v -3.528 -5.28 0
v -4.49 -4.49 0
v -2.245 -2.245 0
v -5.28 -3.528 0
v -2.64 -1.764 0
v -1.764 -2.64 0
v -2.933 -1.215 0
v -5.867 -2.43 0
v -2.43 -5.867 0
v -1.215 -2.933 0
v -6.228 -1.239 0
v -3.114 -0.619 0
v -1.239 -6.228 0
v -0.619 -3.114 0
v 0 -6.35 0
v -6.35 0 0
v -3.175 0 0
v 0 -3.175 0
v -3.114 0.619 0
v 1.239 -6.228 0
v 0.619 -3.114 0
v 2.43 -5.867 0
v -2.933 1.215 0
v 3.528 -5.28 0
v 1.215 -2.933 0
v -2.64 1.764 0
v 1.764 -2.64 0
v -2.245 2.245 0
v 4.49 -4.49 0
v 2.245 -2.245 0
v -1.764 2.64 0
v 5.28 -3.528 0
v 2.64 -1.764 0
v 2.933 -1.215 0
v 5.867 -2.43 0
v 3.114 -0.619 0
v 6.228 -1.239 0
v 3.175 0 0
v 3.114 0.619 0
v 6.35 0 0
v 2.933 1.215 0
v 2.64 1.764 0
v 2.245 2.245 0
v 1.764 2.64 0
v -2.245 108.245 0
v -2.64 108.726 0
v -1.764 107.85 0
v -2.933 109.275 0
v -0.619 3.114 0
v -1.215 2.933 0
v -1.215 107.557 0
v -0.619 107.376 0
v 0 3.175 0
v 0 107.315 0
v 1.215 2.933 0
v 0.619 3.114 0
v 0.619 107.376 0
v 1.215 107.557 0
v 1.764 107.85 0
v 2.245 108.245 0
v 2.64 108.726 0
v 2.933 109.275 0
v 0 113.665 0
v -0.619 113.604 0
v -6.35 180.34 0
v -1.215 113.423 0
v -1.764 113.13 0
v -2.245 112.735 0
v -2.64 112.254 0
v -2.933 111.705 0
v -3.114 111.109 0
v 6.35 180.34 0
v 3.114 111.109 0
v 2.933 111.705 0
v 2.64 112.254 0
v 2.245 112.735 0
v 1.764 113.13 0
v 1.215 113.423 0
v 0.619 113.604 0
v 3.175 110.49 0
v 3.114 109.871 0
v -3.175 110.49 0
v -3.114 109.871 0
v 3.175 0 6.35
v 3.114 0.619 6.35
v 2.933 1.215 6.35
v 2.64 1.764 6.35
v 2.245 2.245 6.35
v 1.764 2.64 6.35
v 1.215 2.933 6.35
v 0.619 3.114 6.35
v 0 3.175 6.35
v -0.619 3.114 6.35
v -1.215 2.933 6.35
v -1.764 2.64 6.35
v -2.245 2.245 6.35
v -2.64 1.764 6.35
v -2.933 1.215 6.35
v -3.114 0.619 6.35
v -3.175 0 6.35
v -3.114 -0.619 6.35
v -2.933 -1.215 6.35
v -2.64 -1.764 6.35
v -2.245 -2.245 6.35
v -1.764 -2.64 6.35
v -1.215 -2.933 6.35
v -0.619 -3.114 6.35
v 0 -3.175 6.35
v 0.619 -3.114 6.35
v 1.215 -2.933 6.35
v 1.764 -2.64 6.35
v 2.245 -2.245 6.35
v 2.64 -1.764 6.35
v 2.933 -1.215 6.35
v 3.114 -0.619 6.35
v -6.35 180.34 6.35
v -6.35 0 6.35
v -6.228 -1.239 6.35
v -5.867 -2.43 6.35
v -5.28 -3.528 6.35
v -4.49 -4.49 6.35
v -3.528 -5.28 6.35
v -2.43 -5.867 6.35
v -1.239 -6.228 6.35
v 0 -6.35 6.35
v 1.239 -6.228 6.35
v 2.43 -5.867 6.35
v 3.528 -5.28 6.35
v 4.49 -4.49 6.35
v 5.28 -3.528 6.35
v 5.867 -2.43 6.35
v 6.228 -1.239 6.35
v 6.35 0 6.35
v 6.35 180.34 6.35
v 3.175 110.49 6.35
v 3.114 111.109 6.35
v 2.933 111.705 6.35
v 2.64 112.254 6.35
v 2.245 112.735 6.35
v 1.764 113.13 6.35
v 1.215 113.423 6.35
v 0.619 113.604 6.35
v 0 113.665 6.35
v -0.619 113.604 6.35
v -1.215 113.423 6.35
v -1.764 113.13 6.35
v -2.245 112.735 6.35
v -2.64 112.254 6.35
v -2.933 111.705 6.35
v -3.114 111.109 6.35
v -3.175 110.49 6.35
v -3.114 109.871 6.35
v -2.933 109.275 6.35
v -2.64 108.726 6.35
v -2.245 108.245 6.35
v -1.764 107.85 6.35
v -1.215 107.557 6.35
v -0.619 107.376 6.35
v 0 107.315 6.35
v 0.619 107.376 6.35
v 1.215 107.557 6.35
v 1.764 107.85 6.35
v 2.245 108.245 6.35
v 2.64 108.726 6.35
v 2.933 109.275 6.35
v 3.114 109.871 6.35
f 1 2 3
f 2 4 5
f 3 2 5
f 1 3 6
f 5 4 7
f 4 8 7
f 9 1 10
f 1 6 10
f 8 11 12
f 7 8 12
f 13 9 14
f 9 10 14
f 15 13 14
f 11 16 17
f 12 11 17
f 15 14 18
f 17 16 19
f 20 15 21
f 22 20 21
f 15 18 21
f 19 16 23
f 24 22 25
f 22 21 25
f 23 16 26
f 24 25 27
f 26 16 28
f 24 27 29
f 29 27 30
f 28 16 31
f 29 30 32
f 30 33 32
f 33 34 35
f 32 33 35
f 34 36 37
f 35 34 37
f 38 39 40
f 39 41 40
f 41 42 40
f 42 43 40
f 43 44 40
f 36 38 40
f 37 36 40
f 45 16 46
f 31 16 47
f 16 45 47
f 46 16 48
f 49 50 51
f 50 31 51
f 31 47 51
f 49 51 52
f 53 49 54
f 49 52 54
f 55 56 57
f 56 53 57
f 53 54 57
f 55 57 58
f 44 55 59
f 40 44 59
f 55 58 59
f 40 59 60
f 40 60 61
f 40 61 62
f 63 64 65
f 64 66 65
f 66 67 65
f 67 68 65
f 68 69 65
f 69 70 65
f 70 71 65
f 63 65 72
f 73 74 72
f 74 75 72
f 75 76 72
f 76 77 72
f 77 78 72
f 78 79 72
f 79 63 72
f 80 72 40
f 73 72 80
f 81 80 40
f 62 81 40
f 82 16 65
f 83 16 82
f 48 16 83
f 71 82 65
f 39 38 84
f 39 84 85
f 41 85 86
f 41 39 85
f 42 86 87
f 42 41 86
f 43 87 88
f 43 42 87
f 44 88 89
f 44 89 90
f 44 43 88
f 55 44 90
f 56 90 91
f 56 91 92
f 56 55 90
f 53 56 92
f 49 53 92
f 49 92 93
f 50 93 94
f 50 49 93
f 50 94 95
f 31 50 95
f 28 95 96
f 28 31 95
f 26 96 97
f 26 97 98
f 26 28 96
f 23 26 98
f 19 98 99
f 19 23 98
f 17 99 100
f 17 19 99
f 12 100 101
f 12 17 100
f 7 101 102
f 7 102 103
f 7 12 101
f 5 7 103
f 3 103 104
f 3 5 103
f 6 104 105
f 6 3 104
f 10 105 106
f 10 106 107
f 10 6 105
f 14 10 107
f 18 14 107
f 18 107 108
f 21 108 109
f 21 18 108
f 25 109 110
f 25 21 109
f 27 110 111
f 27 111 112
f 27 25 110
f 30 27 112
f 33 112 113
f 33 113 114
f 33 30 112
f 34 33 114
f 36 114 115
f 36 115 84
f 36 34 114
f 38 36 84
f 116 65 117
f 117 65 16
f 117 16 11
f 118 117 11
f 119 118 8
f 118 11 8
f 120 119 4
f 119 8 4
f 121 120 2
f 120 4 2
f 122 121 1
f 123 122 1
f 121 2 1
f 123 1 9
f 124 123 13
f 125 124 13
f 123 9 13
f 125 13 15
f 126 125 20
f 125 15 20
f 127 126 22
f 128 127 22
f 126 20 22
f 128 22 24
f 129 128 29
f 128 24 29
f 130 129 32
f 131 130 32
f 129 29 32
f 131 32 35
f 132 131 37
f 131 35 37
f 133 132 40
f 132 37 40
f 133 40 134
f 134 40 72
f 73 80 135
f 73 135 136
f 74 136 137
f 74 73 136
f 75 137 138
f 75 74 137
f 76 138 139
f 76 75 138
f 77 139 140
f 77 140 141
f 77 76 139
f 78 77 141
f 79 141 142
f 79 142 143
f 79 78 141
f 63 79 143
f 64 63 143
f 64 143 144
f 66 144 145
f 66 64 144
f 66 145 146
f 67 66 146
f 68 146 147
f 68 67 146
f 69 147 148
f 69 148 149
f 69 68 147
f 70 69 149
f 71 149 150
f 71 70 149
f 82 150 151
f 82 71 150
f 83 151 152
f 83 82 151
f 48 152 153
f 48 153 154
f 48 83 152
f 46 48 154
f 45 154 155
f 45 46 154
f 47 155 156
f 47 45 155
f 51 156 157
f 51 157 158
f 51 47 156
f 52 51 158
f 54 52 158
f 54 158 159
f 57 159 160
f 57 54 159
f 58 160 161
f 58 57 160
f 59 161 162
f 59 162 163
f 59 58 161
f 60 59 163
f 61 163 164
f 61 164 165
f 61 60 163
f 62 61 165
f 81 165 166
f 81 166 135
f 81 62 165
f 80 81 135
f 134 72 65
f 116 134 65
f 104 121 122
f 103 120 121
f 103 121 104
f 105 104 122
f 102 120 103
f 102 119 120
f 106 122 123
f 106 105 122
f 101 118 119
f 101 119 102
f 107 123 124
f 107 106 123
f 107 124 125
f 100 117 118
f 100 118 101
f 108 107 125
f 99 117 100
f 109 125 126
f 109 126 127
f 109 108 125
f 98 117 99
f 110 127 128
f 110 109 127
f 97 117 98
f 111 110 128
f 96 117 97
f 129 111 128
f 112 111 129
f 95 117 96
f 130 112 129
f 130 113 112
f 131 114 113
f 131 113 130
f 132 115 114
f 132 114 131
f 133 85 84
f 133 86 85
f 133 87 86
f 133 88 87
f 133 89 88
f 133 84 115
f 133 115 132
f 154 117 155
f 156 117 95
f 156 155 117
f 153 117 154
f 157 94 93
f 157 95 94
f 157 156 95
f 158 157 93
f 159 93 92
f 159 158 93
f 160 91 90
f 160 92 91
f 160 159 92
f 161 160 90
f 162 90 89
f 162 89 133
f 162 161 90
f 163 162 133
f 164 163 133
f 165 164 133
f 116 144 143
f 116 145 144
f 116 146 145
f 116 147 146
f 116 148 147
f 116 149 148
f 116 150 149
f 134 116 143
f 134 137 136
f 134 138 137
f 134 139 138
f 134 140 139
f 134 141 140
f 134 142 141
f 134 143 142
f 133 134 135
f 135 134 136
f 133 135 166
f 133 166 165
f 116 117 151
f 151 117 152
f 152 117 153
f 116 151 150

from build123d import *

# Parameters (mm, degrees)
SKETCH1_R           = 3.175
BOSS_EXTRUDE1_DEPTH = 6.35


with BuildPart() as part:
    # Sketch1 → Boss-Extrude1 (new body)
    with BuildSketch(Plane.XY):
        with BuildLine():
            Line((-6.35, 110.49), (-6.35, 0))
            ThreePointArc((-6.35, 0), (0, -6.35), (6.35, 0))
            Line((6.35, 0), (6.35, 110.49))
            Line((6.35, 110.49), (6.35, 180.34))
            Line((6.35, 180.34), (-6.35, 180.34))
            Line((-6.35, 180.34), (-6.35, 110.49))
        make_face()
        with Locations((0, 110.49)):
            Circle(SKETCH1_R, mode=Mode.SUBTRACT)
        Circle(SKETCH1_R, mode=Mode.SUBTRACT)
    extrude(amount=BOSS_EXTRUDE1_DEPTH)


solid = part.part
